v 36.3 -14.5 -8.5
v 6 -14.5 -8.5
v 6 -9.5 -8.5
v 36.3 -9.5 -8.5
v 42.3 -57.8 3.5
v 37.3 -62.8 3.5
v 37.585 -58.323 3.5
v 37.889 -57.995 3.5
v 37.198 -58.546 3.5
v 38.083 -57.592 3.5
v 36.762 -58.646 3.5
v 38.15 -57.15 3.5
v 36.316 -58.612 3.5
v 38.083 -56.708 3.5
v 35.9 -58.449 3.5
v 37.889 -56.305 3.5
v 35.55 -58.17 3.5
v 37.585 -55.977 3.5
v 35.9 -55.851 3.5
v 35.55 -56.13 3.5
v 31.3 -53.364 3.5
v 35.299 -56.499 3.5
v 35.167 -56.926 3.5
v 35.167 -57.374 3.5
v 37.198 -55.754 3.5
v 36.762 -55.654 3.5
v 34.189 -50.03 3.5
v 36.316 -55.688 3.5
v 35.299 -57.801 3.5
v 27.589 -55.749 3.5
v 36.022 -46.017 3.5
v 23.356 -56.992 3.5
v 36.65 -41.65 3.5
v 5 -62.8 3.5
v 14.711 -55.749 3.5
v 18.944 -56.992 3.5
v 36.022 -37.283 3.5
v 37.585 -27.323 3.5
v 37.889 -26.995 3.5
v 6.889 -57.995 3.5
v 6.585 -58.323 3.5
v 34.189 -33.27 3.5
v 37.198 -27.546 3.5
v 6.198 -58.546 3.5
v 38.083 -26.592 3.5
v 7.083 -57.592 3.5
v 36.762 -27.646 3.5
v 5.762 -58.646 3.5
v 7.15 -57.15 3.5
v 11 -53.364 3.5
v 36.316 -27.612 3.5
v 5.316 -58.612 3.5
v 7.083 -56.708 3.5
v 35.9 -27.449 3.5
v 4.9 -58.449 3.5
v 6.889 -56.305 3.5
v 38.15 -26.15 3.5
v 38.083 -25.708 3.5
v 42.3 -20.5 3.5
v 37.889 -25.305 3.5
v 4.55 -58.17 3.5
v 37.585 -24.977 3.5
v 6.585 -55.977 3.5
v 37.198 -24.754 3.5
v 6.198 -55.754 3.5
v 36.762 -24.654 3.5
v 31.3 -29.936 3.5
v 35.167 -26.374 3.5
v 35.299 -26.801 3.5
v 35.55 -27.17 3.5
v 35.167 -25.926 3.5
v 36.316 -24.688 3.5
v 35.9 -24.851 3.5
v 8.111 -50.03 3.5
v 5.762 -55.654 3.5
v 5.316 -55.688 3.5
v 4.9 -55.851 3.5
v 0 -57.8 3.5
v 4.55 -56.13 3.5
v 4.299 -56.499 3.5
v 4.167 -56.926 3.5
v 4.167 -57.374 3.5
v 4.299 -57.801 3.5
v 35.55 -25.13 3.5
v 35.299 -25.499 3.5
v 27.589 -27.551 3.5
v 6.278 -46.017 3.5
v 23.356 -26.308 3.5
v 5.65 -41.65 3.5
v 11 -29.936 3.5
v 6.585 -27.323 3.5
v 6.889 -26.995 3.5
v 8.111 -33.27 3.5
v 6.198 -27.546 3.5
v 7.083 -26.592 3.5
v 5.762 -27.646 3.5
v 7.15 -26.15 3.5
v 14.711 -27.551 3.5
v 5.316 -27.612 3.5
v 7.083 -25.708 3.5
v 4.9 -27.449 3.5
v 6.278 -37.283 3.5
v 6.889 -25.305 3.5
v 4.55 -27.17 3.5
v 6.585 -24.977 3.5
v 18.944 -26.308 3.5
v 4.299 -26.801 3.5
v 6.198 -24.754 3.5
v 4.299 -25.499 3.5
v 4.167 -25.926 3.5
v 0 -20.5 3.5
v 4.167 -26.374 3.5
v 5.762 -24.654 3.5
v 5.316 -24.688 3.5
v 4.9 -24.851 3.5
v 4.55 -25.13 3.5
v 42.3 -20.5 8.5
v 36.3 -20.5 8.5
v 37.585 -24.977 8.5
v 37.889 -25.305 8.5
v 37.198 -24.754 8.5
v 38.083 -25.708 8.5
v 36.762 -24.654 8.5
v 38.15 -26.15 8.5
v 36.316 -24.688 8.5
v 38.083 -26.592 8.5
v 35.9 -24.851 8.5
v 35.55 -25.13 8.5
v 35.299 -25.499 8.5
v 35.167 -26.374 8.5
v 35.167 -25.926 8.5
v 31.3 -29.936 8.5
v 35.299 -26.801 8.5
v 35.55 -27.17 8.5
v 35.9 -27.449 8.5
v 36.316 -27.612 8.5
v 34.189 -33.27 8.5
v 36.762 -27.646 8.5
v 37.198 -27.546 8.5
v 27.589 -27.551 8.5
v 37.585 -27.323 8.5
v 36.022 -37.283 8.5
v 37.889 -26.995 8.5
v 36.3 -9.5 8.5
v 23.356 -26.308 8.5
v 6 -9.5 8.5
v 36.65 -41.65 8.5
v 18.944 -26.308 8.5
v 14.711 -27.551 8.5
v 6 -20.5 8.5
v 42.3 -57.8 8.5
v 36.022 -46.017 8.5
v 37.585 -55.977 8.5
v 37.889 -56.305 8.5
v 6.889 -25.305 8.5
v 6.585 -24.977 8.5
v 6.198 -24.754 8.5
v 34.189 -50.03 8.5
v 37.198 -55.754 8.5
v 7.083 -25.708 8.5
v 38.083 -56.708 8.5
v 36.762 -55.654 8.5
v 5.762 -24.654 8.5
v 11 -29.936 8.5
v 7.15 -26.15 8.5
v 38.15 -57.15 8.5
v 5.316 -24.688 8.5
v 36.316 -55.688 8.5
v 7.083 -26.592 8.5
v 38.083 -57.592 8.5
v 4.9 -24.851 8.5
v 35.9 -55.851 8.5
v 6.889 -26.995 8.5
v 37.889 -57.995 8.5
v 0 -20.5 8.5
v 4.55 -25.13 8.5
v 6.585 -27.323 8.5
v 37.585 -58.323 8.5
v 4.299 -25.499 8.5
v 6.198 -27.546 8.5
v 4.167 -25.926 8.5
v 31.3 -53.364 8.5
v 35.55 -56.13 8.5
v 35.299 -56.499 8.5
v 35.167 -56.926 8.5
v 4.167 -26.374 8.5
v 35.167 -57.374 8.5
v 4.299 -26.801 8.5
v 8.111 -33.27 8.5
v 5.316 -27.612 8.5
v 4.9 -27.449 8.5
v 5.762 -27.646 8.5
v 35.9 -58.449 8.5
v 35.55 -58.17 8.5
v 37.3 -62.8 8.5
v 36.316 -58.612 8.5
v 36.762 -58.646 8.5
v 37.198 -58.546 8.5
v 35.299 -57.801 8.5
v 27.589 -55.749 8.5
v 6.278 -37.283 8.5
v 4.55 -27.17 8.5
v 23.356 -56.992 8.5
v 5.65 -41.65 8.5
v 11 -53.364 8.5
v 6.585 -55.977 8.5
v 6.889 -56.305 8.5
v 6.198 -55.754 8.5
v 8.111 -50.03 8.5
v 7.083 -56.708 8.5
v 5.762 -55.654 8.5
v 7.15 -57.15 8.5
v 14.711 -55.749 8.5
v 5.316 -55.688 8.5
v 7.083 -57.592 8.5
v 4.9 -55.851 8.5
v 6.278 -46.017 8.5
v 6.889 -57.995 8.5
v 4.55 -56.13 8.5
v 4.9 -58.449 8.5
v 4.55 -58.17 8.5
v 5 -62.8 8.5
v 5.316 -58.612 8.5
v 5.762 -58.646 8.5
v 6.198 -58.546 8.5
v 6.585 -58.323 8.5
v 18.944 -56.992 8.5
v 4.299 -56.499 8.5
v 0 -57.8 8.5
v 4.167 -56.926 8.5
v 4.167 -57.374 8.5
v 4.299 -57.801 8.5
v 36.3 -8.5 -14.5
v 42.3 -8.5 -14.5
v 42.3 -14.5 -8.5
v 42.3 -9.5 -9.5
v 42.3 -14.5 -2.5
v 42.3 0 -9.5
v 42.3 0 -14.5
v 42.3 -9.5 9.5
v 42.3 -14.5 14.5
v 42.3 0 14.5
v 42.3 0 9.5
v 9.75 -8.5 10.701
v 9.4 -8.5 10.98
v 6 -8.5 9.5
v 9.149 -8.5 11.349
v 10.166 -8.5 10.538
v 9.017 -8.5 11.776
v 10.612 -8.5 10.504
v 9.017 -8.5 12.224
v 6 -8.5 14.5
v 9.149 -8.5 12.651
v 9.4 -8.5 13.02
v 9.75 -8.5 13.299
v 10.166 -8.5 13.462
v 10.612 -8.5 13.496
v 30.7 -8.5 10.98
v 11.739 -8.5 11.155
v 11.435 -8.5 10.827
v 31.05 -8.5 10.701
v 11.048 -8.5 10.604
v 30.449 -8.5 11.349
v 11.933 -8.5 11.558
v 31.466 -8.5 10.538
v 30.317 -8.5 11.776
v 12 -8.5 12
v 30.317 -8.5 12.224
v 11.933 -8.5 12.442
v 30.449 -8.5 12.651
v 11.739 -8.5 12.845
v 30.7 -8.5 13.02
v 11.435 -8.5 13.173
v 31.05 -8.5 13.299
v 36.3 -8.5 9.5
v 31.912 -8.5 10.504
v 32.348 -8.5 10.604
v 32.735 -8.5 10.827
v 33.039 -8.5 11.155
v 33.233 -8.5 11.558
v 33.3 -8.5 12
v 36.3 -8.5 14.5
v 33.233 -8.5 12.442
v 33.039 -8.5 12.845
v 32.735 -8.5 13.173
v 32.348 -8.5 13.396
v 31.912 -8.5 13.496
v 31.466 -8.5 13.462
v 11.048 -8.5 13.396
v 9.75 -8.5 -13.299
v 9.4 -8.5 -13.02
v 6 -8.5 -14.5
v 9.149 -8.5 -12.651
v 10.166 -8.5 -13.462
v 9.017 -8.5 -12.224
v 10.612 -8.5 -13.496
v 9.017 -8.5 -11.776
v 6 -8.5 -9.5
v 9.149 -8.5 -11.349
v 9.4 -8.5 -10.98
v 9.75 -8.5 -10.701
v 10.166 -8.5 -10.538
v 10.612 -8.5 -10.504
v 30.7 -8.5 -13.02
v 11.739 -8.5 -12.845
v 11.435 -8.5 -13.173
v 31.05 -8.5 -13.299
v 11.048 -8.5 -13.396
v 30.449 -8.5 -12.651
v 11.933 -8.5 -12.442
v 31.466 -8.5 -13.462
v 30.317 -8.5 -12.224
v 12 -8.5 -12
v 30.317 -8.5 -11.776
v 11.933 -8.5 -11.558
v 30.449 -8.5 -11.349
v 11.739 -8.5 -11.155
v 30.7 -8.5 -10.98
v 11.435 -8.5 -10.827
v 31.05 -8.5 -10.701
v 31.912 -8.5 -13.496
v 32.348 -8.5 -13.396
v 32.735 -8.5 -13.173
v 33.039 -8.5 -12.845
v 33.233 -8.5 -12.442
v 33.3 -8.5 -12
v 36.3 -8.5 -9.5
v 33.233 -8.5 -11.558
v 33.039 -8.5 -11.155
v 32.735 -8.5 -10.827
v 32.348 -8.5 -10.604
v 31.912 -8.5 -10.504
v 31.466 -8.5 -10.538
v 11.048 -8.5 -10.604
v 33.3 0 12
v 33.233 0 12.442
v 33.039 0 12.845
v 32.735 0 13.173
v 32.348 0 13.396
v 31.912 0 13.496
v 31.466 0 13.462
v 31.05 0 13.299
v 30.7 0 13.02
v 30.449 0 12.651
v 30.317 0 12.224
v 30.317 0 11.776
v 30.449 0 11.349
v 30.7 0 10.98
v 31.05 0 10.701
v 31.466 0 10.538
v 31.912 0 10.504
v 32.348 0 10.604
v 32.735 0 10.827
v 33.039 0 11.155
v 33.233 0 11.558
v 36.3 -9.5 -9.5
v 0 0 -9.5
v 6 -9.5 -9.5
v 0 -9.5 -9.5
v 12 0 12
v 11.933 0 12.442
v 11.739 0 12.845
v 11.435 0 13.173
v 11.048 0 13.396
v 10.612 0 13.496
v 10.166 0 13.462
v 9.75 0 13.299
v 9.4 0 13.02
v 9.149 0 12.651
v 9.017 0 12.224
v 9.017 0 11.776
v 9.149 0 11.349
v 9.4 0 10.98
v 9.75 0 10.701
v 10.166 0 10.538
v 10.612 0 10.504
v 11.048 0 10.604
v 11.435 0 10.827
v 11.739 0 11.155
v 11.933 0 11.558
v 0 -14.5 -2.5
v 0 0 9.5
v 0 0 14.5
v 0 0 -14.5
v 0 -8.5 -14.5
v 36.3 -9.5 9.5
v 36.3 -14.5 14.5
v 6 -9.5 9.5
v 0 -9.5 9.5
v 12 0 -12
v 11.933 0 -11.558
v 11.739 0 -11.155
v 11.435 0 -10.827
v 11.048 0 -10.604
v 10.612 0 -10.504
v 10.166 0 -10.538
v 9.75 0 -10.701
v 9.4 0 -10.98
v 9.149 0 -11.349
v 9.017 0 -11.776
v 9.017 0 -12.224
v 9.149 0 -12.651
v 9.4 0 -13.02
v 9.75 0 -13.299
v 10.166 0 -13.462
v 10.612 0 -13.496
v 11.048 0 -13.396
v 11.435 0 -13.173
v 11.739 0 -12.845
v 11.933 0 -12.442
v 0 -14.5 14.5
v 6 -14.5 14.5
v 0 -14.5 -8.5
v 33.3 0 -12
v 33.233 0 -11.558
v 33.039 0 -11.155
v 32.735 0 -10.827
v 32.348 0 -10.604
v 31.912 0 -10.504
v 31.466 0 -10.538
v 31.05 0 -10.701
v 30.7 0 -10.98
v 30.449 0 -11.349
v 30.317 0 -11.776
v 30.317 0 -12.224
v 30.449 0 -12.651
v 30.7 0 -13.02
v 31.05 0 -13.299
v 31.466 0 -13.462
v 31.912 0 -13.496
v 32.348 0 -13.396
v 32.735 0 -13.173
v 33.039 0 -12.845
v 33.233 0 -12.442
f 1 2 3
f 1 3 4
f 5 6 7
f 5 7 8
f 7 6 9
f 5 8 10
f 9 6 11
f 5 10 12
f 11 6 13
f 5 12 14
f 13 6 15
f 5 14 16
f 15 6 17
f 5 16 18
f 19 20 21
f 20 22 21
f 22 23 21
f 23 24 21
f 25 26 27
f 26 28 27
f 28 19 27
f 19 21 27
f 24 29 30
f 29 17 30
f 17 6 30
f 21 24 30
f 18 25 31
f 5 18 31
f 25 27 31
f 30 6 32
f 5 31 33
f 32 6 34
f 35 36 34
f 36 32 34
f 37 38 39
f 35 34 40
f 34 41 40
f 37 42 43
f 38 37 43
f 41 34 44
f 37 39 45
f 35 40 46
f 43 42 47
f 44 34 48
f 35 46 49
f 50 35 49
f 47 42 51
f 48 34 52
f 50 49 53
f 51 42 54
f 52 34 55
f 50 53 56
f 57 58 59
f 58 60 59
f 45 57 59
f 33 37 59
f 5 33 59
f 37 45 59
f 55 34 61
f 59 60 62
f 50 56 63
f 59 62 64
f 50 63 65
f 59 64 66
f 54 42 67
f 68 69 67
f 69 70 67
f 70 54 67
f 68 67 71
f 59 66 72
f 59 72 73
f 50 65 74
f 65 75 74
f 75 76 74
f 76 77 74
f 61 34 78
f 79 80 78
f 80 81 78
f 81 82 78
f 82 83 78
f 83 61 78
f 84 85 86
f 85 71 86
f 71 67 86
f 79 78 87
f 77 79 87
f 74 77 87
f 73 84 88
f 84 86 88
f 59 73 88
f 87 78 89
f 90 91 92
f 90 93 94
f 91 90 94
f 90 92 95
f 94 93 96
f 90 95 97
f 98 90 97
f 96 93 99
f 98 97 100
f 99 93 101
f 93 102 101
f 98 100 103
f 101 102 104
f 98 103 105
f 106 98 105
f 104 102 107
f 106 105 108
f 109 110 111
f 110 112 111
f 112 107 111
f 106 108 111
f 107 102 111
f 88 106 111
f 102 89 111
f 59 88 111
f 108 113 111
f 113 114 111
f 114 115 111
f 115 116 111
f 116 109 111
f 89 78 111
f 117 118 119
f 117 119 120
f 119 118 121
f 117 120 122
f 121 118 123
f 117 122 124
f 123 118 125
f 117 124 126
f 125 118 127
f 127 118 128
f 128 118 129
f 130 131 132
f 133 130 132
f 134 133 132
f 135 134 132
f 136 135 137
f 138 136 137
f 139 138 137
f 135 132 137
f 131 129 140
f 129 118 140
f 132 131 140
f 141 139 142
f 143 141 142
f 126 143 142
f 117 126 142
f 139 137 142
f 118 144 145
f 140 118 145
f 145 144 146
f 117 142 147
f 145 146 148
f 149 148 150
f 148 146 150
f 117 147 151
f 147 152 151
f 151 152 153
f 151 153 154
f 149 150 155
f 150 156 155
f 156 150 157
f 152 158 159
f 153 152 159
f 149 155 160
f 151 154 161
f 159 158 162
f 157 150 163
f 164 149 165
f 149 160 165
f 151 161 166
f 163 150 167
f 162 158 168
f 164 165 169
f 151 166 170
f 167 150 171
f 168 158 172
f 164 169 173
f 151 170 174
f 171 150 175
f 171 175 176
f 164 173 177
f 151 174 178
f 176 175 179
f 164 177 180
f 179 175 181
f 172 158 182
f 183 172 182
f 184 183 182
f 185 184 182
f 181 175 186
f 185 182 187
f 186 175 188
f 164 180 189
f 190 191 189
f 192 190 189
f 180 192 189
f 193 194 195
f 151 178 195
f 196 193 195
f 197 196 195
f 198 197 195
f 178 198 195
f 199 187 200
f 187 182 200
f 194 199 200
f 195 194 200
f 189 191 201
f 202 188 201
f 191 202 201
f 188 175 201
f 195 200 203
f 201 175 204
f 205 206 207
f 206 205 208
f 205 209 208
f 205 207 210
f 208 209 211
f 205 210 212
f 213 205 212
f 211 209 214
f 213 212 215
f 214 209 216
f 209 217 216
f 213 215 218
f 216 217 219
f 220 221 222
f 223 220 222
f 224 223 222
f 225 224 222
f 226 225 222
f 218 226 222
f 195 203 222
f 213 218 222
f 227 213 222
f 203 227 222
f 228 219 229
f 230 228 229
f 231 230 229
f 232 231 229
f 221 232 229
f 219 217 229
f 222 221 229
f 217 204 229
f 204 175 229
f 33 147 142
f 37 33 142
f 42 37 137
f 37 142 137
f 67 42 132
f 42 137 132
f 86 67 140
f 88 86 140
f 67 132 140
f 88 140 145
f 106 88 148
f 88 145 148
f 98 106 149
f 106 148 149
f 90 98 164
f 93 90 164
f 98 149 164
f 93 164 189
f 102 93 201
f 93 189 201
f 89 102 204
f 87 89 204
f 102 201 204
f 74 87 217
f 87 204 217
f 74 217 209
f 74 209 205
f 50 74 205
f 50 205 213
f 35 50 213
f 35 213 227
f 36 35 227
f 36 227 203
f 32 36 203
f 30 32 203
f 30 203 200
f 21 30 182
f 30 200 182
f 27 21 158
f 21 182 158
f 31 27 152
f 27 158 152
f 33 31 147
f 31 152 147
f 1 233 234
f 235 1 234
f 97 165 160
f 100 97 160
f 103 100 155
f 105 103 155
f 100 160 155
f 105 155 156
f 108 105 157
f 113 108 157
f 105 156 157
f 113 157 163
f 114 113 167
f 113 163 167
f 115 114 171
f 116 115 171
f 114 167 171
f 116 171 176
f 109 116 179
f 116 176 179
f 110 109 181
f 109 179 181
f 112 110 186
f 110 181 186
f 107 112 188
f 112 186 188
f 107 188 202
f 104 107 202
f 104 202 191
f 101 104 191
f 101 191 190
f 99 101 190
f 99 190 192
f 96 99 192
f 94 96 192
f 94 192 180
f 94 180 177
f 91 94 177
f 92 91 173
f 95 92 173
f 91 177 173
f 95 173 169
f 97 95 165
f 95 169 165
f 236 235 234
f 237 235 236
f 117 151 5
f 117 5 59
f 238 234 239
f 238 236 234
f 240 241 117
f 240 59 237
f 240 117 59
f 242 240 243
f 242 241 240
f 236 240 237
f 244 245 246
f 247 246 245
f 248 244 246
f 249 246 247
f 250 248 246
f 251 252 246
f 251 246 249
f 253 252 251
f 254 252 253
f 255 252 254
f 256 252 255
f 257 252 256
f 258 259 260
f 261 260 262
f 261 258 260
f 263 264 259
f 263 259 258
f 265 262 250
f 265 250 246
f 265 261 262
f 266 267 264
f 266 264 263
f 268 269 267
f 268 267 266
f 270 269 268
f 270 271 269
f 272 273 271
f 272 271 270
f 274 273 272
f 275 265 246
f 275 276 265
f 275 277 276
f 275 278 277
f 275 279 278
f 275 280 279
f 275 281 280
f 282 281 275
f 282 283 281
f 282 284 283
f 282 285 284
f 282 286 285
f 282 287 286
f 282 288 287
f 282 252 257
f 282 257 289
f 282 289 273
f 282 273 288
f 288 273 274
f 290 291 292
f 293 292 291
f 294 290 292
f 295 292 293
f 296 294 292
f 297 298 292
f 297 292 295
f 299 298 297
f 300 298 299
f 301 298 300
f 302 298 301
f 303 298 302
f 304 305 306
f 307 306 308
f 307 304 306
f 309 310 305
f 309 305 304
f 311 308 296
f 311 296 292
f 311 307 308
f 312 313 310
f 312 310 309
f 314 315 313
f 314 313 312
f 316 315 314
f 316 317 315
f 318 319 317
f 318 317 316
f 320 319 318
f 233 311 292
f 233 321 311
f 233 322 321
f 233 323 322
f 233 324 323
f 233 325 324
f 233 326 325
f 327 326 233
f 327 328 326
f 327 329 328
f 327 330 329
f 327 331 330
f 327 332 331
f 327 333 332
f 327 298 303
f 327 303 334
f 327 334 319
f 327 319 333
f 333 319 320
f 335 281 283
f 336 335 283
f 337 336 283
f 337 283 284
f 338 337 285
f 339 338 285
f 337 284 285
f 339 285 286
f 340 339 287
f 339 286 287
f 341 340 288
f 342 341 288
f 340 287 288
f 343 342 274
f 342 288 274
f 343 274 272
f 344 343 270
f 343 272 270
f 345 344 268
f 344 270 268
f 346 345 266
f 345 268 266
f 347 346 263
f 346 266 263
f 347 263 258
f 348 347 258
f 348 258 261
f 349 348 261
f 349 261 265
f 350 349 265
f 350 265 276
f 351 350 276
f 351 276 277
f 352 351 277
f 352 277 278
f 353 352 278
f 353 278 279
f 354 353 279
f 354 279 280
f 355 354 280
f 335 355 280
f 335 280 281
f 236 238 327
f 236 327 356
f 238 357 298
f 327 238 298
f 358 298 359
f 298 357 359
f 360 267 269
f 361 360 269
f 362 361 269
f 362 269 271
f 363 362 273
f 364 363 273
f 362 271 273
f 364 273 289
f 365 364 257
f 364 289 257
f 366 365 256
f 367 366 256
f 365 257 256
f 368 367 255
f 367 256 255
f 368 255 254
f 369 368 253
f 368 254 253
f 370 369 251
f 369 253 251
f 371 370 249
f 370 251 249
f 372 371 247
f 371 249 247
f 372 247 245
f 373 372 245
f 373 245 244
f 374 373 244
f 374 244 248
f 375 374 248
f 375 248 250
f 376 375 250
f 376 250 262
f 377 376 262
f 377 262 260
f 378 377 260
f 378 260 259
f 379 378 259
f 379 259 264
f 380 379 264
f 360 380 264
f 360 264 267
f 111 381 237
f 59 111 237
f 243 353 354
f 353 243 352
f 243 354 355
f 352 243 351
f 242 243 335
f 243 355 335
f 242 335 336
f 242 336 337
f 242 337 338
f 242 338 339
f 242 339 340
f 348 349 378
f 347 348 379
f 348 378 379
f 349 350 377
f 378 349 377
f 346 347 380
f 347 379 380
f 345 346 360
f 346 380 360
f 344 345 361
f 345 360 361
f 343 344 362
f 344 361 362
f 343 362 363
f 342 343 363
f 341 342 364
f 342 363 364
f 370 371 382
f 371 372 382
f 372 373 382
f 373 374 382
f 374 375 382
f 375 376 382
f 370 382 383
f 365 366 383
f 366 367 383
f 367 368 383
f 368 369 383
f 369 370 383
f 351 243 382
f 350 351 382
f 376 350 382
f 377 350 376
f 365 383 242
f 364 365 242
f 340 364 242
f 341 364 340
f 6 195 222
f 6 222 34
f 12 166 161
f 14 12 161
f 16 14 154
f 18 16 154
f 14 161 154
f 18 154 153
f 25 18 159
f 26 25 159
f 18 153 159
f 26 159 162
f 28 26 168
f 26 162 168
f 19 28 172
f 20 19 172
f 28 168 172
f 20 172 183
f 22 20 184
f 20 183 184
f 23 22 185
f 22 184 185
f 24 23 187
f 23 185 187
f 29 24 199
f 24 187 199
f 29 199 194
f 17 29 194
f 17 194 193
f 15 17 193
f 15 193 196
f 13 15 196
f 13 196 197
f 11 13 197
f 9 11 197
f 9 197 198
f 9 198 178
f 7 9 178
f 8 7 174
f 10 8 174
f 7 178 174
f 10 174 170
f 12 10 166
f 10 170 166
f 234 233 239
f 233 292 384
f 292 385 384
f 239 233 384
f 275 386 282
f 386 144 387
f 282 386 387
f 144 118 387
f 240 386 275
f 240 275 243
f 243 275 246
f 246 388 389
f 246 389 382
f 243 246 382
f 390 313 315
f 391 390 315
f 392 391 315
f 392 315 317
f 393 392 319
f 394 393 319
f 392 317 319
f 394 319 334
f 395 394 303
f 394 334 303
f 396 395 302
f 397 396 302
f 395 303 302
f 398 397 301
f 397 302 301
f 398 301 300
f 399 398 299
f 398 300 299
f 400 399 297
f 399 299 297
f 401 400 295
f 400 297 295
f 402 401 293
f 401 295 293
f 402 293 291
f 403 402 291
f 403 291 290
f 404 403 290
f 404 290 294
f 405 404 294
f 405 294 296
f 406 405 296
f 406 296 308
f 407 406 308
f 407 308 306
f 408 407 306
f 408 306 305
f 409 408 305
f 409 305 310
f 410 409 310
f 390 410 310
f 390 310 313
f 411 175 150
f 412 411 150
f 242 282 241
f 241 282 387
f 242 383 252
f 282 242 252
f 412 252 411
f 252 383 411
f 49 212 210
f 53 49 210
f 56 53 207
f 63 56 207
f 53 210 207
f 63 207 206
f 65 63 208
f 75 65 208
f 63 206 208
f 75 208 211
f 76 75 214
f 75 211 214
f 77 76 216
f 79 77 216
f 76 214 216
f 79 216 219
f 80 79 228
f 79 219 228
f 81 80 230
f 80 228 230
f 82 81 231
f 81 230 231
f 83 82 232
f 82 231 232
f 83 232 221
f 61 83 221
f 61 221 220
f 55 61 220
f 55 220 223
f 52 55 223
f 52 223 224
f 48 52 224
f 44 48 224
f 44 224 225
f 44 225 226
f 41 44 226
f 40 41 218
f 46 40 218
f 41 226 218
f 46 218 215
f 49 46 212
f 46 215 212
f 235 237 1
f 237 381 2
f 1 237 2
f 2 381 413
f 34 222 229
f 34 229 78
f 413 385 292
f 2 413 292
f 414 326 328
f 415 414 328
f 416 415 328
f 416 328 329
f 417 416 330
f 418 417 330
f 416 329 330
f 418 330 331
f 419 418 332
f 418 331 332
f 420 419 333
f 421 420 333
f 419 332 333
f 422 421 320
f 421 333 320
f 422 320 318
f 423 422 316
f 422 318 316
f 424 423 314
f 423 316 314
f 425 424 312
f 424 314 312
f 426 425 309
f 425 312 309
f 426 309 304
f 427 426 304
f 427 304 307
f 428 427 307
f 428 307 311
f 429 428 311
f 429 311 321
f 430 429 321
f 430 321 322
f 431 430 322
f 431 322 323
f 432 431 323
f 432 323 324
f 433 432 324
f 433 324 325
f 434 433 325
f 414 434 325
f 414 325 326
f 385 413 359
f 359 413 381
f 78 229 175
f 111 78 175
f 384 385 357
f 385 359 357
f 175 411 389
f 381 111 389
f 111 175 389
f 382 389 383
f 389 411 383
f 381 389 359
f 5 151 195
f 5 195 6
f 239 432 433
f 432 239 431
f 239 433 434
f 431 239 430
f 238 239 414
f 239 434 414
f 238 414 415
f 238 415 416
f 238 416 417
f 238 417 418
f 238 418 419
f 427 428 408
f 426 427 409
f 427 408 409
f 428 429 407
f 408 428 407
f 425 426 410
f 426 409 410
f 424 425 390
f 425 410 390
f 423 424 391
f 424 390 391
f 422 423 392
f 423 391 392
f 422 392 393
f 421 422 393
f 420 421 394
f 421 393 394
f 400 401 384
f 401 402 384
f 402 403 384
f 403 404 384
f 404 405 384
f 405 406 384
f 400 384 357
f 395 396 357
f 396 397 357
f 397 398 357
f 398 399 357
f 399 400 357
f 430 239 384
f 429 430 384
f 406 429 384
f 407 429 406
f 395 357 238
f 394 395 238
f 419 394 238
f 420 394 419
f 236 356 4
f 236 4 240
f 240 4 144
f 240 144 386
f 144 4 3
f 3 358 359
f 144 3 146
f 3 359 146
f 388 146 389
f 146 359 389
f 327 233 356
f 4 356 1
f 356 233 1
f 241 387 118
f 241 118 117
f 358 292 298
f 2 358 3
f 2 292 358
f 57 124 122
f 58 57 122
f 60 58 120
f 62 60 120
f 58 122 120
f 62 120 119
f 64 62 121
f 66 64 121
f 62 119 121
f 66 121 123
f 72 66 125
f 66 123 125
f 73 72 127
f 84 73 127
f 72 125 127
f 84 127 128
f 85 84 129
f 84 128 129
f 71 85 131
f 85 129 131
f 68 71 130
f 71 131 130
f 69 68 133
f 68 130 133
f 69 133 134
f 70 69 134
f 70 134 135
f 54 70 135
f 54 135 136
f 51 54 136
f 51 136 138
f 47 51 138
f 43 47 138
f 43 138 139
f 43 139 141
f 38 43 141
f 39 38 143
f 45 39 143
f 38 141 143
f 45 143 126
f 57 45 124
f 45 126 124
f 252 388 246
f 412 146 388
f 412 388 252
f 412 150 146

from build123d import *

# Parameters (mm, degrees)
F1_DEPTH  = 42.3
F3_W      = 30.3
F3_H      = 6
F4_DEPTH  = 6
F2_W      = 30.3
F2_H      = 6
F5_DEPTH  = 12
F6_SIZE   = 5.99999
F7_R      = 1.5
F8_DEPTH  = 8.501
F9_R      = 1.5
F10_DEPTH = 8.501
F11_R     = 1.5
F11_R_2   = 15.5
F12_DEPTH = 5
F13_SIZE  = 5


# Not quite as in the source:
# - a fillet or chamfer is up to 0.001 mm smaller than in the source, because OpenCascade refuses the exact size
# - a feature names something its author has since deleted; it is built from what else it names


with BuildPart() as f1:
    # F0 (on Right) → F1 (new body)
    with BuildSketch(Plane.YZ):
        Polygon((-9.5, 9.5), (0, 9.5), (0, 14.5), (-14.5, 14.5), (-20.5, 14.5), (-20.5, 8.5), (-62.8, 8.5), (-62.8, 3.5), (-20.5, 3.5), (-20.5, -2.5), (-14.5, -2.5), (-14.5, -14.5), (0, -14.5), (0, -9.5), (-9.5, -9.5), align=None)
    extrude(amount=F1_DEPTH)

    # F3 (on face) → F4 (cut)
    with BuildSketch(Plane.XZ.offset(14.5)):
        with Locations((21.15, -11.5)):
            Rectangle(F3_W, F3_H)
    extrude(amount=-F4_DEPTH, mode=Mode.SUBTRACT)

    # F2 (on face) → F5 (cut)
    with BuildSketch(Plane.XZ.offset(20.5)):
        with Locations((21.15, 11.5)):
            Rectangle(F2_W, F2_H)
    extrude(amount=-F5_DEPTH, mode=Mode.SUBTRACT)

    # F6 (size 6 in the source; OpenCascade refuses exactly that, so slightly less here)
    f6_edges = [f1.edges().sort_by_distance(p)[0] for p in [
        (3, -14.5, -14.5),
        (39.3, -14.5, -14.5),
        (3, -20.5, 14.5),
        (39.3, -20.5, 14.5),
        (21.15, -20.5, -2.5),
    ]]
    chamfer(f6_edges, length=F6_SIZE)

    # F7 (on face) → F8 (cut, through all)
    with BuildSketch(Plane.XZ.offset(8.5)):
        with Locations((10.5, 12)):
            Circle(F7_R)
        with Locations((31.8, 12)):
            Circle(F7_R)
    extrude(amount=-F8_DEPTH, mode=Mode.SUBTRACT)

    # F9 (on face) → F10 (cut, through all)
    with BuildSketch(Plane.XZ.offset(8.5)):
        with Locations((10.5, -12)):
            Circle(F9_R)
        with Locations((31.8, -12)):
            Circle(F9_R)
    extrude(amount=-F10_DEPTH, mode=Mode.SUBTRACT)

    # F11 (on face) → F12 (cut, through all)
    with BuildSketch(Plane.XY.offset(8.5)):
        with Locations((5.65, -57.15)):
            Circle(F11_R)
        with Locations((5.65, -26.15)):
            Circle(F11_R)
        with Locations((36.65, -26.15)):
            Circle(F11_R)
        with Locations((36.65, -57.15)):
            Circle(F11_R)
        with Locations((21.15, -41.65)):
            Circle(F11_R_2)
    extrude(amount=-F12_DEPTH, mode=Mode.SUBTRACT)

    # F13
    f13_edges = [f1.edges().sort_by_distance(p)[0] for p in [
        (42.3, -62.8, 6),
        (0, -62.8, 6),
    ]]
    chamfer(f13_edges, length=F13_SIZE)


solid = f1.part
